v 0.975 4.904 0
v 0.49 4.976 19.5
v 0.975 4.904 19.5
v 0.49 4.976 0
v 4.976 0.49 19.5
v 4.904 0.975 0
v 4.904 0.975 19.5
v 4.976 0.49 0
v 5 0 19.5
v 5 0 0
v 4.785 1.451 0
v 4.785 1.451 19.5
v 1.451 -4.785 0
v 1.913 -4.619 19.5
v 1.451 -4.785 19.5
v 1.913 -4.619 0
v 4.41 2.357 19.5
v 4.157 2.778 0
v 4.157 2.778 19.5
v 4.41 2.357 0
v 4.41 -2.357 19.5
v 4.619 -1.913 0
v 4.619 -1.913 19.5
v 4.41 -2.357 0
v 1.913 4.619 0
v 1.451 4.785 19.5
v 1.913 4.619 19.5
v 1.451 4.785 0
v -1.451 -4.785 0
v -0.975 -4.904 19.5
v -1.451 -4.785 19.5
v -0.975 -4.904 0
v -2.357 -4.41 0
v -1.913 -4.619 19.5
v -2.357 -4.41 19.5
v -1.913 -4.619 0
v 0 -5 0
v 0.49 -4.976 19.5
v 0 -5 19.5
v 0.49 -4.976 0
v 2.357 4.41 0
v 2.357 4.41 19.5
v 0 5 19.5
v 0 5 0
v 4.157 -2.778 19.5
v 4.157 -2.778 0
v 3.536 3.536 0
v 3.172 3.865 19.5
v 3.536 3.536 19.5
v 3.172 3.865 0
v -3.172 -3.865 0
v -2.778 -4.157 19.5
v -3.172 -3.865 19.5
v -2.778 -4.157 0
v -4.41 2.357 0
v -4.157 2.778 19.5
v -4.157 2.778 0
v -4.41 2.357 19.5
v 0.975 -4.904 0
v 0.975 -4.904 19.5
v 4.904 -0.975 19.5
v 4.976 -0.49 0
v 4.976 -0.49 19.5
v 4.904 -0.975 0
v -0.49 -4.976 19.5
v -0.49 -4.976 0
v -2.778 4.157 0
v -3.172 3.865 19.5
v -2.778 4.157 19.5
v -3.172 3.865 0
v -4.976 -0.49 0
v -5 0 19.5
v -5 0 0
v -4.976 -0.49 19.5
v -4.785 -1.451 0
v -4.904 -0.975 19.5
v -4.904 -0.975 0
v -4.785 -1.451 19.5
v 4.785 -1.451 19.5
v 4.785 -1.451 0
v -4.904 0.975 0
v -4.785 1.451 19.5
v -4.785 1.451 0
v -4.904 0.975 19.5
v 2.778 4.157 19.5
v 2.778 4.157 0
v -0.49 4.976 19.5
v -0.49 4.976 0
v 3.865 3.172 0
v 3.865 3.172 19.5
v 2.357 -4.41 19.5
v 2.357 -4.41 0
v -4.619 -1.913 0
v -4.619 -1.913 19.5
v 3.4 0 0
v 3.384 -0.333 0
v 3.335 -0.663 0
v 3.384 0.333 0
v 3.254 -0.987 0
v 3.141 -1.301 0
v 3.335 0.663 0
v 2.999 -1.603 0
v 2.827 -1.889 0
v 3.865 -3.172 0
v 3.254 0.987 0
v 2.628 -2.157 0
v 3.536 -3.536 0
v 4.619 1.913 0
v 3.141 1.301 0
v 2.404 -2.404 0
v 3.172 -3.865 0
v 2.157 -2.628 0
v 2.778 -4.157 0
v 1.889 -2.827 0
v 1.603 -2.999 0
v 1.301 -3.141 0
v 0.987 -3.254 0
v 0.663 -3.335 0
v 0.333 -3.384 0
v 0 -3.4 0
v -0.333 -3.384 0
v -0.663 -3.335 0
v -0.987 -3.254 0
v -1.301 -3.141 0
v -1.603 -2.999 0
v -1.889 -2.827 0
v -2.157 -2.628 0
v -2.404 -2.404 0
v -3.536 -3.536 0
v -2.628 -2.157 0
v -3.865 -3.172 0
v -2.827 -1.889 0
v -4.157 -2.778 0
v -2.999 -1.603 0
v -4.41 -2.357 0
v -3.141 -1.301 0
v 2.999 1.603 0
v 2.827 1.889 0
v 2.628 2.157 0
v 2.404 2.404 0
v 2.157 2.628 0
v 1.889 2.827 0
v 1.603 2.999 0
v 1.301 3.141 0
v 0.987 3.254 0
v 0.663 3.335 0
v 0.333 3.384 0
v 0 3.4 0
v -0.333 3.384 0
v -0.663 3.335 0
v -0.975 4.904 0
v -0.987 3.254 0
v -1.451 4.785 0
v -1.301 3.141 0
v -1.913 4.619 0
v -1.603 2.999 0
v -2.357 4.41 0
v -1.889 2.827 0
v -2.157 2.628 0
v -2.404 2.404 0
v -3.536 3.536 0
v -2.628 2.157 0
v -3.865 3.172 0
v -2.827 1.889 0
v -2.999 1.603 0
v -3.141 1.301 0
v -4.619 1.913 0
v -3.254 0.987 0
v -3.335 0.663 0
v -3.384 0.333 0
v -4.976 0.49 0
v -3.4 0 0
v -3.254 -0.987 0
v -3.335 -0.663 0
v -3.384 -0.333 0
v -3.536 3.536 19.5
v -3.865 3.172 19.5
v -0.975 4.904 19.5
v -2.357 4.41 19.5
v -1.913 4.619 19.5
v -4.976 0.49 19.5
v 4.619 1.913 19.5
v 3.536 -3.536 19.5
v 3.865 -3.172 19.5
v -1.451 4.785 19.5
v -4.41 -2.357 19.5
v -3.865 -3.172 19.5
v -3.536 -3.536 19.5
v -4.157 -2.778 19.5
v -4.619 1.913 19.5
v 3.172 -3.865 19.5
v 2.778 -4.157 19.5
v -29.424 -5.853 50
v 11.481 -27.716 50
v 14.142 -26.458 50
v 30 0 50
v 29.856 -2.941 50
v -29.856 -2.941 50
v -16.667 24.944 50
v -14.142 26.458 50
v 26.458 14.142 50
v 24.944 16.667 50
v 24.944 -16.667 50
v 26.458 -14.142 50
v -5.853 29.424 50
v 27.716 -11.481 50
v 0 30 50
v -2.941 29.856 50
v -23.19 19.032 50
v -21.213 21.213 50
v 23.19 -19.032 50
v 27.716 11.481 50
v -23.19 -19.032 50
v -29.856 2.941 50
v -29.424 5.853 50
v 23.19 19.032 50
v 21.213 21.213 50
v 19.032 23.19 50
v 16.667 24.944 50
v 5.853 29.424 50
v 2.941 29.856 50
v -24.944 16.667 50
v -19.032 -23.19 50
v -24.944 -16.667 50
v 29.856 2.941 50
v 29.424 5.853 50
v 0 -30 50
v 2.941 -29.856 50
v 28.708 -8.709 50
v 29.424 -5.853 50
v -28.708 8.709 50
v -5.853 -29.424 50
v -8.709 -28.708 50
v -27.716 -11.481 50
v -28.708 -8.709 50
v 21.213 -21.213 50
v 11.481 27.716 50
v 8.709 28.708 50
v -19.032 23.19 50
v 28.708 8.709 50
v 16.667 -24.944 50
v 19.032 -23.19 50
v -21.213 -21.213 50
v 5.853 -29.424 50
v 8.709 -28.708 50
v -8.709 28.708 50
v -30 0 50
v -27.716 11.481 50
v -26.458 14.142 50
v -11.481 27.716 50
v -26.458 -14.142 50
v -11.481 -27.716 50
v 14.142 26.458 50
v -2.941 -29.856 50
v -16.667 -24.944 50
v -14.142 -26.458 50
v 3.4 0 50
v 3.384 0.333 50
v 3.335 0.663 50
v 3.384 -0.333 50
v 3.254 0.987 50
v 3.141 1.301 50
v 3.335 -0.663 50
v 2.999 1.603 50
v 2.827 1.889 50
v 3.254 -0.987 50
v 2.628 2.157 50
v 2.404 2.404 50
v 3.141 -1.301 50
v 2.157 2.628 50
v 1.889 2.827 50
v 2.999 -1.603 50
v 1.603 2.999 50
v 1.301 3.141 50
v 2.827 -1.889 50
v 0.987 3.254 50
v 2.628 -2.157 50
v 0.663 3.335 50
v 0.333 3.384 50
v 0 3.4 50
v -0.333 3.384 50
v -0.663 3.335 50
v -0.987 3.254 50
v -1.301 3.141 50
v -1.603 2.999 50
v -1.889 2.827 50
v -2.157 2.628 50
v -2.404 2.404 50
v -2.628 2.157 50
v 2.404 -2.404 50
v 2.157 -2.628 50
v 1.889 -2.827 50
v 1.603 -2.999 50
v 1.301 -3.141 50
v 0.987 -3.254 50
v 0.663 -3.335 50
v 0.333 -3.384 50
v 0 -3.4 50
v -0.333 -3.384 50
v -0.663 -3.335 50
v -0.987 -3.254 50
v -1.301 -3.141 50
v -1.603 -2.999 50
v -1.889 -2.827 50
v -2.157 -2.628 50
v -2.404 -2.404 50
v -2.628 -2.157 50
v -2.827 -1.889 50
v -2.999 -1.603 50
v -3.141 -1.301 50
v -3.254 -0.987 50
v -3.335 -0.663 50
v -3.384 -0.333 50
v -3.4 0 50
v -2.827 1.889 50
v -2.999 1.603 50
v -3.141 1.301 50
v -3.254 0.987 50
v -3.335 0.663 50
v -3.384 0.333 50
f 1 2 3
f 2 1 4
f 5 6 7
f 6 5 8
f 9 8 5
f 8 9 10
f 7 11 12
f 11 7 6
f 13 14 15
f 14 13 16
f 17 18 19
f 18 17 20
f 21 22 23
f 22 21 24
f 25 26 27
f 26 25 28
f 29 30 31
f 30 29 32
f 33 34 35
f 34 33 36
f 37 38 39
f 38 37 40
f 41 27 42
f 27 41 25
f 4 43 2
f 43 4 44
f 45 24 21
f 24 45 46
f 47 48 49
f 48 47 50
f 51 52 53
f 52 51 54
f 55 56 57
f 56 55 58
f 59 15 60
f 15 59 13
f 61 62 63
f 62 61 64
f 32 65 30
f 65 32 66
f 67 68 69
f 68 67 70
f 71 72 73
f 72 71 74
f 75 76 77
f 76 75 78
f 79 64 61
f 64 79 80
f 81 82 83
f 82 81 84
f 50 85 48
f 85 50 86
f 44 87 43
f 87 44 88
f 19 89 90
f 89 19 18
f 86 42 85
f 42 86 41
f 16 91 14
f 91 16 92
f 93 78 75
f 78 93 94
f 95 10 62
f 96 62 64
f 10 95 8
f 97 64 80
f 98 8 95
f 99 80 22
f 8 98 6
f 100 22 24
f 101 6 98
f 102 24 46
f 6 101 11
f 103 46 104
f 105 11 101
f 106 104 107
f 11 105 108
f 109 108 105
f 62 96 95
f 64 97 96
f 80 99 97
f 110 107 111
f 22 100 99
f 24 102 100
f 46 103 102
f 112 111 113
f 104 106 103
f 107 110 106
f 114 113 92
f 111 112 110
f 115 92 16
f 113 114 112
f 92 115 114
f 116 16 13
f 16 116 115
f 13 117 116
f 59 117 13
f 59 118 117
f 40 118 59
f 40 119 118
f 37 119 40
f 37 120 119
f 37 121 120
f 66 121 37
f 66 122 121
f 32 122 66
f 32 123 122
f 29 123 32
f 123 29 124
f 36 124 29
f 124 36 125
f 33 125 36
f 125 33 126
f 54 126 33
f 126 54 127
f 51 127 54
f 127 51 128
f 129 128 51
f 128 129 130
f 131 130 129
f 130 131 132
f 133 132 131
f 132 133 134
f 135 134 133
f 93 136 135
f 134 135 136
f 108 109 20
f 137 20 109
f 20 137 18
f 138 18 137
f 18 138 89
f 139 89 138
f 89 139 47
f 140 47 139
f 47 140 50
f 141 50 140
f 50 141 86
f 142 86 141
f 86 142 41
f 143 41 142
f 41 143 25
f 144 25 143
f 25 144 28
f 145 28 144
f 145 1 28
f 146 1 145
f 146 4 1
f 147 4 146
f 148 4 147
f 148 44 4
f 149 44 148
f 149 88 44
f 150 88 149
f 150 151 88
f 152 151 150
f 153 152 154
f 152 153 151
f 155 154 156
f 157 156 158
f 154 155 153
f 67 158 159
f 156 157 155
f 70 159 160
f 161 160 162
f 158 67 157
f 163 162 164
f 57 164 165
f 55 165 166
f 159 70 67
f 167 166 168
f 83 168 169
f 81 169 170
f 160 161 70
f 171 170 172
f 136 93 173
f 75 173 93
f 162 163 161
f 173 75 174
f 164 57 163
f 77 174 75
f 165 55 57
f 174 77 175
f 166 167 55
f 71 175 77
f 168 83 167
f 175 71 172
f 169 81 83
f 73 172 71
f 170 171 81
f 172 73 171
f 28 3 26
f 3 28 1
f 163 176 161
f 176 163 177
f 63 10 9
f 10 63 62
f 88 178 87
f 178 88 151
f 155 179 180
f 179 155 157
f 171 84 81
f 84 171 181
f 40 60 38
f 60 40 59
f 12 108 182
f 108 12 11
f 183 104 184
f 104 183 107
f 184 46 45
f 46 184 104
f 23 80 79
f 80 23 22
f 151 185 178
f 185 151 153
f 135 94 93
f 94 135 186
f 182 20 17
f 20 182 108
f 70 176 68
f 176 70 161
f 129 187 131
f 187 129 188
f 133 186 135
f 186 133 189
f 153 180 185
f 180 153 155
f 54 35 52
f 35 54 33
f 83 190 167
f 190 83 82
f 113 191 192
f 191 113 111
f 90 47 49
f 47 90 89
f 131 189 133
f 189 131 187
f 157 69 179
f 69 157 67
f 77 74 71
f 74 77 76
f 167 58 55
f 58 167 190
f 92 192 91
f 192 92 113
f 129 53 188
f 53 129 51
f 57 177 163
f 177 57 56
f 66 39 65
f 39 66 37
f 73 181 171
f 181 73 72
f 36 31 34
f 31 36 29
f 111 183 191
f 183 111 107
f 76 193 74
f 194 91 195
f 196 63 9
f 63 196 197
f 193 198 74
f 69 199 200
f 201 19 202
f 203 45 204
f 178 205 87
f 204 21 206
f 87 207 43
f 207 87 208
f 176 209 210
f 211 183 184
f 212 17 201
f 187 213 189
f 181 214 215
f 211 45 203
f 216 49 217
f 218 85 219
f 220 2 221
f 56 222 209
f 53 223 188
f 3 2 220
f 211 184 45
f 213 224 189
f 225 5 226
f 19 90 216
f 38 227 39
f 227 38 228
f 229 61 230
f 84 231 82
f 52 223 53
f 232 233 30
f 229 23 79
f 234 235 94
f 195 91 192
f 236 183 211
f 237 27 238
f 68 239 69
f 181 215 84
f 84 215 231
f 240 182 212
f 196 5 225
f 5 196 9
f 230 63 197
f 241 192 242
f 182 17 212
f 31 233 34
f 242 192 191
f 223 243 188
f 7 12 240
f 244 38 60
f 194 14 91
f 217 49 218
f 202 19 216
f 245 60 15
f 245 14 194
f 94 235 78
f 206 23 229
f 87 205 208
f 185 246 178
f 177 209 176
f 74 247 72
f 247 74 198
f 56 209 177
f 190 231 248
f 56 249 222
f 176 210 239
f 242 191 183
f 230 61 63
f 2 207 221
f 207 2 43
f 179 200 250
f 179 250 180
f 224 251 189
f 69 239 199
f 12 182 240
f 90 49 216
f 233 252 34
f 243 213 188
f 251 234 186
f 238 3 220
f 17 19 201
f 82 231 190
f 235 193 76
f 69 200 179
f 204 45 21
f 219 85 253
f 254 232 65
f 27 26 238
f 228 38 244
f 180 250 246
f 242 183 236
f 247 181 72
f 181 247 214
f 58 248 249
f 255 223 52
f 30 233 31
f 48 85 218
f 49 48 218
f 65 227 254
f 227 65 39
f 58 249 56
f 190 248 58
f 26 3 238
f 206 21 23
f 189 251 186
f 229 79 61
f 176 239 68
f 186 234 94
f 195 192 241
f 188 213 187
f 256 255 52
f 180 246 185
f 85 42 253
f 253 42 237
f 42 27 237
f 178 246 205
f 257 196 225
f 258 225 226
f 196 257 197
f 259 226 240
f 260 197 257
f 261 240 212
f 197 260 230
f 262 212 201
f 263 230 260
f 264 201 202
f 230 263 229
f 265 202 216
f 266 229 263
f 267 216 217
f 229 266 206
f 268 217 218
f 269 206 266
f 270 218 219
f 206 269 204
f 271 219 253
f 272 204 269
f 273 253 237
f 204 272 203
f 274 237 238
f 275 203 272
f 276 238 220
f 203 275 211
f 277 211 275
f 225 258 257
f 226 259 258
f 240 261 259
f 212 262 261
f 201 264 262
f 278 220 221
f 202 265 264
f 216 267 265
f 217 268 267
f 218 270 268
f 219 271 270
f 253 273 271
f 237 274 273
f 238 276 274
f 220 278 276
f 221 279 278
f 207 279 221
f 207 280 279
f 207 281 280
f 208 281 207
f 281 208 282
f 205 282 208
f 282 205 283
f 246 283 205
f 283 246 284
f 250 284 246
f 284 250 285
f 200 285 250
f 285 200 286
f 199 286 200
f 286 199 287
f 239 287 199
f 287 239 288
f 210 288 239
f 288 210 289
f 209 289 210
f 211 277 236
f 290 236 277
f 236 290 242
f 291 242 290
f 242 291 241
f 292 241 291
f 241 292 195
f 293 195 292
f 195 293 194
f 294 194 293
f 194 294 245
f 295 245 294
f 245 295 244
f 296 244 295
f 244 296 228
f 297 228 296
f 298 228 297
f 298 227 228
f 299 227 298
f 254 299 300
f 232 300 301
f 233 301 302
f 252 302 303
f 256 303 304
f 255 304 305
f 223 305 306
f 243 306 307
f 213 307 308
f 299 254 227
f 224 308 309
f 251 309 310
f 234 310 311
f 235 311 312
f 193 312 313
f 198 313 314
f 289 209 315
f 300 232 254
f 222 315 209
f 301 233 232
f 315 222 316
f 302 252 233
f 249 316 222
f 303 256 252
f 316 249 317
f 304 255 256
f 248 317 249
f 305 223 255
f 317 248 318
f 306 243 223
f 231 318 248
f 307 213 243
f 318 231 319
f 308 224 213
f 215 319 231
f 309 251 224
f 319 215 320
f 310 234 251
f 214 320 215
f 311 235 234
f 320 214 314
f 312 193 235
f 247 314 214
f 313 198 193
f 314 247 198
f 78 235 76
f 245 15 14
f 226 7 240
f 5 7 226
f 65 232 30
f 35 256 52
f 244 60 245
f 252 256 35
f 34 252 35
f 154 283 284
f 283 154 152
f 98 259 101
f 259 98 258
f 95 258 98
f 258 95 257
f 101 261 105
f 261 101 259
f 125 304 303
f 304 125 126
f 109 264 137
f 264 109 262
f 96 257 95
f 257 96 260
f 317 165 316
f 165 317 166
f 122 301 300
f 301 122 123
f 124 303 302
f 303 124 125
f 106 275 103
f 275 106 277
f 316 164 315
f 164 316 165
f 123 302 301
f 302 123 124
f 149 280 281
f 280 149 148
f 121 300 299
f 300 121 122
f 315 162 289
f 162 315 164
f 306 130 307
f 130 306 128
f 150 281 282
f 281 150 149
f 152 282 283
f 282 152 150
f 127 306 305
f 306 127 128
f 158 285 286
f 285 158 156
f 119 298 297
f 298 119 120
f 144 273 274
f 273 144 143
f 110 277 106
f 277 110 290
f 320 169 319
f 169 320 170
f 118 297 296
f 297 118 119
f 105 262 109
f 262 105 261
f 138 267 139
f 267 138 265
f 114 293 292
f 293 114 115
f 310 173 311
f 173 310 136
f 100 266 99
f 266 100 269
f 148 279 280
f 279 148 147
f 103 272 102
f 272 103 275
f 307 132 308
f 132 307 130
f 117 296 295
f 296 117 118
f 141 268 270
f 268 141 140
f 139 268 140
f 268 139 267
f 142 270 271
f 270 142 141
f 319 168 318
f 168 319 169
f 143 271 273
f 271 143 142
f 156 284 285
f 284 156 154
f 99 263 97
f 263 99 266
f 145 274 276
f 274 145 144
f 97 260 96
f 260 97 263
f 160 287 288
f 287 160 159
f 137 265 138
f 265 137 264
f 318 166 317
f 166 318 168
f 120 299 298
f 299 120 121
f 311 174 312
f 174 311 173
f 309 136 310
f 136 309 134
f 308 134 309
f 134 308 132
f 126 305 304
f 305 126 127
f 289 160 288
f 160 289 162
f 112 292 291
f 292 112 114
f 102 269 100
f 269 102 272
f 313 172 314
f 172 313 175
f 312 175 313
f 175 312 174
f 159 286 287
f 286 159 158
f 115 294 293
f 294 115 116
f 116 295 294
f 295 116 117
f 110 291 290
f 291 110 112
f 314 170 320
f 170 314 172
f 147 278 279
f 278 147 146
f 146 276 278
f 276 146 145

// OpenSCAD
// Lab funnel - printed upright, wide opening at the top
// Units: mm

$fn = 64;

// ---- Dimensions ----
spout_od      = 10;   // spout outer diameter
spout_h       = 20;   // spout height (z = 0 to 20)
cone_bottom_d = 10;   // cone outer diameter at z = 20
cone_top_d    = 60;   // cone outer diameter at the rim
cone_h        = 30;   // cone height (z = 20 to 50)
wall          = 1.6;  // wall thickness everywhere
eps           = 0.5;  // overlap / cut extension

// Derived
bore = spout_od - 2 * wall;  // spout bore = 6.8 mm

// ---- Model ----
difference() {
    union() {
        // Spout
        translate([0, 0, 0])
            cylinder(d = spout_od, h = spout_h);

        // Cone, slightly overlapping the spout for a clean union
        translate([0, 0, spout_h - eps])
            cylinder(d1 = cone_bottom_d, d2 = cone_top_d, h = cone_h + eps);
    }

    // Through-cut for the bore (extends past both ends)
    translate([0, 0, -eps])
        cylinder(d = bore, h = spout_h + cone_h + 2 * eps);
}
